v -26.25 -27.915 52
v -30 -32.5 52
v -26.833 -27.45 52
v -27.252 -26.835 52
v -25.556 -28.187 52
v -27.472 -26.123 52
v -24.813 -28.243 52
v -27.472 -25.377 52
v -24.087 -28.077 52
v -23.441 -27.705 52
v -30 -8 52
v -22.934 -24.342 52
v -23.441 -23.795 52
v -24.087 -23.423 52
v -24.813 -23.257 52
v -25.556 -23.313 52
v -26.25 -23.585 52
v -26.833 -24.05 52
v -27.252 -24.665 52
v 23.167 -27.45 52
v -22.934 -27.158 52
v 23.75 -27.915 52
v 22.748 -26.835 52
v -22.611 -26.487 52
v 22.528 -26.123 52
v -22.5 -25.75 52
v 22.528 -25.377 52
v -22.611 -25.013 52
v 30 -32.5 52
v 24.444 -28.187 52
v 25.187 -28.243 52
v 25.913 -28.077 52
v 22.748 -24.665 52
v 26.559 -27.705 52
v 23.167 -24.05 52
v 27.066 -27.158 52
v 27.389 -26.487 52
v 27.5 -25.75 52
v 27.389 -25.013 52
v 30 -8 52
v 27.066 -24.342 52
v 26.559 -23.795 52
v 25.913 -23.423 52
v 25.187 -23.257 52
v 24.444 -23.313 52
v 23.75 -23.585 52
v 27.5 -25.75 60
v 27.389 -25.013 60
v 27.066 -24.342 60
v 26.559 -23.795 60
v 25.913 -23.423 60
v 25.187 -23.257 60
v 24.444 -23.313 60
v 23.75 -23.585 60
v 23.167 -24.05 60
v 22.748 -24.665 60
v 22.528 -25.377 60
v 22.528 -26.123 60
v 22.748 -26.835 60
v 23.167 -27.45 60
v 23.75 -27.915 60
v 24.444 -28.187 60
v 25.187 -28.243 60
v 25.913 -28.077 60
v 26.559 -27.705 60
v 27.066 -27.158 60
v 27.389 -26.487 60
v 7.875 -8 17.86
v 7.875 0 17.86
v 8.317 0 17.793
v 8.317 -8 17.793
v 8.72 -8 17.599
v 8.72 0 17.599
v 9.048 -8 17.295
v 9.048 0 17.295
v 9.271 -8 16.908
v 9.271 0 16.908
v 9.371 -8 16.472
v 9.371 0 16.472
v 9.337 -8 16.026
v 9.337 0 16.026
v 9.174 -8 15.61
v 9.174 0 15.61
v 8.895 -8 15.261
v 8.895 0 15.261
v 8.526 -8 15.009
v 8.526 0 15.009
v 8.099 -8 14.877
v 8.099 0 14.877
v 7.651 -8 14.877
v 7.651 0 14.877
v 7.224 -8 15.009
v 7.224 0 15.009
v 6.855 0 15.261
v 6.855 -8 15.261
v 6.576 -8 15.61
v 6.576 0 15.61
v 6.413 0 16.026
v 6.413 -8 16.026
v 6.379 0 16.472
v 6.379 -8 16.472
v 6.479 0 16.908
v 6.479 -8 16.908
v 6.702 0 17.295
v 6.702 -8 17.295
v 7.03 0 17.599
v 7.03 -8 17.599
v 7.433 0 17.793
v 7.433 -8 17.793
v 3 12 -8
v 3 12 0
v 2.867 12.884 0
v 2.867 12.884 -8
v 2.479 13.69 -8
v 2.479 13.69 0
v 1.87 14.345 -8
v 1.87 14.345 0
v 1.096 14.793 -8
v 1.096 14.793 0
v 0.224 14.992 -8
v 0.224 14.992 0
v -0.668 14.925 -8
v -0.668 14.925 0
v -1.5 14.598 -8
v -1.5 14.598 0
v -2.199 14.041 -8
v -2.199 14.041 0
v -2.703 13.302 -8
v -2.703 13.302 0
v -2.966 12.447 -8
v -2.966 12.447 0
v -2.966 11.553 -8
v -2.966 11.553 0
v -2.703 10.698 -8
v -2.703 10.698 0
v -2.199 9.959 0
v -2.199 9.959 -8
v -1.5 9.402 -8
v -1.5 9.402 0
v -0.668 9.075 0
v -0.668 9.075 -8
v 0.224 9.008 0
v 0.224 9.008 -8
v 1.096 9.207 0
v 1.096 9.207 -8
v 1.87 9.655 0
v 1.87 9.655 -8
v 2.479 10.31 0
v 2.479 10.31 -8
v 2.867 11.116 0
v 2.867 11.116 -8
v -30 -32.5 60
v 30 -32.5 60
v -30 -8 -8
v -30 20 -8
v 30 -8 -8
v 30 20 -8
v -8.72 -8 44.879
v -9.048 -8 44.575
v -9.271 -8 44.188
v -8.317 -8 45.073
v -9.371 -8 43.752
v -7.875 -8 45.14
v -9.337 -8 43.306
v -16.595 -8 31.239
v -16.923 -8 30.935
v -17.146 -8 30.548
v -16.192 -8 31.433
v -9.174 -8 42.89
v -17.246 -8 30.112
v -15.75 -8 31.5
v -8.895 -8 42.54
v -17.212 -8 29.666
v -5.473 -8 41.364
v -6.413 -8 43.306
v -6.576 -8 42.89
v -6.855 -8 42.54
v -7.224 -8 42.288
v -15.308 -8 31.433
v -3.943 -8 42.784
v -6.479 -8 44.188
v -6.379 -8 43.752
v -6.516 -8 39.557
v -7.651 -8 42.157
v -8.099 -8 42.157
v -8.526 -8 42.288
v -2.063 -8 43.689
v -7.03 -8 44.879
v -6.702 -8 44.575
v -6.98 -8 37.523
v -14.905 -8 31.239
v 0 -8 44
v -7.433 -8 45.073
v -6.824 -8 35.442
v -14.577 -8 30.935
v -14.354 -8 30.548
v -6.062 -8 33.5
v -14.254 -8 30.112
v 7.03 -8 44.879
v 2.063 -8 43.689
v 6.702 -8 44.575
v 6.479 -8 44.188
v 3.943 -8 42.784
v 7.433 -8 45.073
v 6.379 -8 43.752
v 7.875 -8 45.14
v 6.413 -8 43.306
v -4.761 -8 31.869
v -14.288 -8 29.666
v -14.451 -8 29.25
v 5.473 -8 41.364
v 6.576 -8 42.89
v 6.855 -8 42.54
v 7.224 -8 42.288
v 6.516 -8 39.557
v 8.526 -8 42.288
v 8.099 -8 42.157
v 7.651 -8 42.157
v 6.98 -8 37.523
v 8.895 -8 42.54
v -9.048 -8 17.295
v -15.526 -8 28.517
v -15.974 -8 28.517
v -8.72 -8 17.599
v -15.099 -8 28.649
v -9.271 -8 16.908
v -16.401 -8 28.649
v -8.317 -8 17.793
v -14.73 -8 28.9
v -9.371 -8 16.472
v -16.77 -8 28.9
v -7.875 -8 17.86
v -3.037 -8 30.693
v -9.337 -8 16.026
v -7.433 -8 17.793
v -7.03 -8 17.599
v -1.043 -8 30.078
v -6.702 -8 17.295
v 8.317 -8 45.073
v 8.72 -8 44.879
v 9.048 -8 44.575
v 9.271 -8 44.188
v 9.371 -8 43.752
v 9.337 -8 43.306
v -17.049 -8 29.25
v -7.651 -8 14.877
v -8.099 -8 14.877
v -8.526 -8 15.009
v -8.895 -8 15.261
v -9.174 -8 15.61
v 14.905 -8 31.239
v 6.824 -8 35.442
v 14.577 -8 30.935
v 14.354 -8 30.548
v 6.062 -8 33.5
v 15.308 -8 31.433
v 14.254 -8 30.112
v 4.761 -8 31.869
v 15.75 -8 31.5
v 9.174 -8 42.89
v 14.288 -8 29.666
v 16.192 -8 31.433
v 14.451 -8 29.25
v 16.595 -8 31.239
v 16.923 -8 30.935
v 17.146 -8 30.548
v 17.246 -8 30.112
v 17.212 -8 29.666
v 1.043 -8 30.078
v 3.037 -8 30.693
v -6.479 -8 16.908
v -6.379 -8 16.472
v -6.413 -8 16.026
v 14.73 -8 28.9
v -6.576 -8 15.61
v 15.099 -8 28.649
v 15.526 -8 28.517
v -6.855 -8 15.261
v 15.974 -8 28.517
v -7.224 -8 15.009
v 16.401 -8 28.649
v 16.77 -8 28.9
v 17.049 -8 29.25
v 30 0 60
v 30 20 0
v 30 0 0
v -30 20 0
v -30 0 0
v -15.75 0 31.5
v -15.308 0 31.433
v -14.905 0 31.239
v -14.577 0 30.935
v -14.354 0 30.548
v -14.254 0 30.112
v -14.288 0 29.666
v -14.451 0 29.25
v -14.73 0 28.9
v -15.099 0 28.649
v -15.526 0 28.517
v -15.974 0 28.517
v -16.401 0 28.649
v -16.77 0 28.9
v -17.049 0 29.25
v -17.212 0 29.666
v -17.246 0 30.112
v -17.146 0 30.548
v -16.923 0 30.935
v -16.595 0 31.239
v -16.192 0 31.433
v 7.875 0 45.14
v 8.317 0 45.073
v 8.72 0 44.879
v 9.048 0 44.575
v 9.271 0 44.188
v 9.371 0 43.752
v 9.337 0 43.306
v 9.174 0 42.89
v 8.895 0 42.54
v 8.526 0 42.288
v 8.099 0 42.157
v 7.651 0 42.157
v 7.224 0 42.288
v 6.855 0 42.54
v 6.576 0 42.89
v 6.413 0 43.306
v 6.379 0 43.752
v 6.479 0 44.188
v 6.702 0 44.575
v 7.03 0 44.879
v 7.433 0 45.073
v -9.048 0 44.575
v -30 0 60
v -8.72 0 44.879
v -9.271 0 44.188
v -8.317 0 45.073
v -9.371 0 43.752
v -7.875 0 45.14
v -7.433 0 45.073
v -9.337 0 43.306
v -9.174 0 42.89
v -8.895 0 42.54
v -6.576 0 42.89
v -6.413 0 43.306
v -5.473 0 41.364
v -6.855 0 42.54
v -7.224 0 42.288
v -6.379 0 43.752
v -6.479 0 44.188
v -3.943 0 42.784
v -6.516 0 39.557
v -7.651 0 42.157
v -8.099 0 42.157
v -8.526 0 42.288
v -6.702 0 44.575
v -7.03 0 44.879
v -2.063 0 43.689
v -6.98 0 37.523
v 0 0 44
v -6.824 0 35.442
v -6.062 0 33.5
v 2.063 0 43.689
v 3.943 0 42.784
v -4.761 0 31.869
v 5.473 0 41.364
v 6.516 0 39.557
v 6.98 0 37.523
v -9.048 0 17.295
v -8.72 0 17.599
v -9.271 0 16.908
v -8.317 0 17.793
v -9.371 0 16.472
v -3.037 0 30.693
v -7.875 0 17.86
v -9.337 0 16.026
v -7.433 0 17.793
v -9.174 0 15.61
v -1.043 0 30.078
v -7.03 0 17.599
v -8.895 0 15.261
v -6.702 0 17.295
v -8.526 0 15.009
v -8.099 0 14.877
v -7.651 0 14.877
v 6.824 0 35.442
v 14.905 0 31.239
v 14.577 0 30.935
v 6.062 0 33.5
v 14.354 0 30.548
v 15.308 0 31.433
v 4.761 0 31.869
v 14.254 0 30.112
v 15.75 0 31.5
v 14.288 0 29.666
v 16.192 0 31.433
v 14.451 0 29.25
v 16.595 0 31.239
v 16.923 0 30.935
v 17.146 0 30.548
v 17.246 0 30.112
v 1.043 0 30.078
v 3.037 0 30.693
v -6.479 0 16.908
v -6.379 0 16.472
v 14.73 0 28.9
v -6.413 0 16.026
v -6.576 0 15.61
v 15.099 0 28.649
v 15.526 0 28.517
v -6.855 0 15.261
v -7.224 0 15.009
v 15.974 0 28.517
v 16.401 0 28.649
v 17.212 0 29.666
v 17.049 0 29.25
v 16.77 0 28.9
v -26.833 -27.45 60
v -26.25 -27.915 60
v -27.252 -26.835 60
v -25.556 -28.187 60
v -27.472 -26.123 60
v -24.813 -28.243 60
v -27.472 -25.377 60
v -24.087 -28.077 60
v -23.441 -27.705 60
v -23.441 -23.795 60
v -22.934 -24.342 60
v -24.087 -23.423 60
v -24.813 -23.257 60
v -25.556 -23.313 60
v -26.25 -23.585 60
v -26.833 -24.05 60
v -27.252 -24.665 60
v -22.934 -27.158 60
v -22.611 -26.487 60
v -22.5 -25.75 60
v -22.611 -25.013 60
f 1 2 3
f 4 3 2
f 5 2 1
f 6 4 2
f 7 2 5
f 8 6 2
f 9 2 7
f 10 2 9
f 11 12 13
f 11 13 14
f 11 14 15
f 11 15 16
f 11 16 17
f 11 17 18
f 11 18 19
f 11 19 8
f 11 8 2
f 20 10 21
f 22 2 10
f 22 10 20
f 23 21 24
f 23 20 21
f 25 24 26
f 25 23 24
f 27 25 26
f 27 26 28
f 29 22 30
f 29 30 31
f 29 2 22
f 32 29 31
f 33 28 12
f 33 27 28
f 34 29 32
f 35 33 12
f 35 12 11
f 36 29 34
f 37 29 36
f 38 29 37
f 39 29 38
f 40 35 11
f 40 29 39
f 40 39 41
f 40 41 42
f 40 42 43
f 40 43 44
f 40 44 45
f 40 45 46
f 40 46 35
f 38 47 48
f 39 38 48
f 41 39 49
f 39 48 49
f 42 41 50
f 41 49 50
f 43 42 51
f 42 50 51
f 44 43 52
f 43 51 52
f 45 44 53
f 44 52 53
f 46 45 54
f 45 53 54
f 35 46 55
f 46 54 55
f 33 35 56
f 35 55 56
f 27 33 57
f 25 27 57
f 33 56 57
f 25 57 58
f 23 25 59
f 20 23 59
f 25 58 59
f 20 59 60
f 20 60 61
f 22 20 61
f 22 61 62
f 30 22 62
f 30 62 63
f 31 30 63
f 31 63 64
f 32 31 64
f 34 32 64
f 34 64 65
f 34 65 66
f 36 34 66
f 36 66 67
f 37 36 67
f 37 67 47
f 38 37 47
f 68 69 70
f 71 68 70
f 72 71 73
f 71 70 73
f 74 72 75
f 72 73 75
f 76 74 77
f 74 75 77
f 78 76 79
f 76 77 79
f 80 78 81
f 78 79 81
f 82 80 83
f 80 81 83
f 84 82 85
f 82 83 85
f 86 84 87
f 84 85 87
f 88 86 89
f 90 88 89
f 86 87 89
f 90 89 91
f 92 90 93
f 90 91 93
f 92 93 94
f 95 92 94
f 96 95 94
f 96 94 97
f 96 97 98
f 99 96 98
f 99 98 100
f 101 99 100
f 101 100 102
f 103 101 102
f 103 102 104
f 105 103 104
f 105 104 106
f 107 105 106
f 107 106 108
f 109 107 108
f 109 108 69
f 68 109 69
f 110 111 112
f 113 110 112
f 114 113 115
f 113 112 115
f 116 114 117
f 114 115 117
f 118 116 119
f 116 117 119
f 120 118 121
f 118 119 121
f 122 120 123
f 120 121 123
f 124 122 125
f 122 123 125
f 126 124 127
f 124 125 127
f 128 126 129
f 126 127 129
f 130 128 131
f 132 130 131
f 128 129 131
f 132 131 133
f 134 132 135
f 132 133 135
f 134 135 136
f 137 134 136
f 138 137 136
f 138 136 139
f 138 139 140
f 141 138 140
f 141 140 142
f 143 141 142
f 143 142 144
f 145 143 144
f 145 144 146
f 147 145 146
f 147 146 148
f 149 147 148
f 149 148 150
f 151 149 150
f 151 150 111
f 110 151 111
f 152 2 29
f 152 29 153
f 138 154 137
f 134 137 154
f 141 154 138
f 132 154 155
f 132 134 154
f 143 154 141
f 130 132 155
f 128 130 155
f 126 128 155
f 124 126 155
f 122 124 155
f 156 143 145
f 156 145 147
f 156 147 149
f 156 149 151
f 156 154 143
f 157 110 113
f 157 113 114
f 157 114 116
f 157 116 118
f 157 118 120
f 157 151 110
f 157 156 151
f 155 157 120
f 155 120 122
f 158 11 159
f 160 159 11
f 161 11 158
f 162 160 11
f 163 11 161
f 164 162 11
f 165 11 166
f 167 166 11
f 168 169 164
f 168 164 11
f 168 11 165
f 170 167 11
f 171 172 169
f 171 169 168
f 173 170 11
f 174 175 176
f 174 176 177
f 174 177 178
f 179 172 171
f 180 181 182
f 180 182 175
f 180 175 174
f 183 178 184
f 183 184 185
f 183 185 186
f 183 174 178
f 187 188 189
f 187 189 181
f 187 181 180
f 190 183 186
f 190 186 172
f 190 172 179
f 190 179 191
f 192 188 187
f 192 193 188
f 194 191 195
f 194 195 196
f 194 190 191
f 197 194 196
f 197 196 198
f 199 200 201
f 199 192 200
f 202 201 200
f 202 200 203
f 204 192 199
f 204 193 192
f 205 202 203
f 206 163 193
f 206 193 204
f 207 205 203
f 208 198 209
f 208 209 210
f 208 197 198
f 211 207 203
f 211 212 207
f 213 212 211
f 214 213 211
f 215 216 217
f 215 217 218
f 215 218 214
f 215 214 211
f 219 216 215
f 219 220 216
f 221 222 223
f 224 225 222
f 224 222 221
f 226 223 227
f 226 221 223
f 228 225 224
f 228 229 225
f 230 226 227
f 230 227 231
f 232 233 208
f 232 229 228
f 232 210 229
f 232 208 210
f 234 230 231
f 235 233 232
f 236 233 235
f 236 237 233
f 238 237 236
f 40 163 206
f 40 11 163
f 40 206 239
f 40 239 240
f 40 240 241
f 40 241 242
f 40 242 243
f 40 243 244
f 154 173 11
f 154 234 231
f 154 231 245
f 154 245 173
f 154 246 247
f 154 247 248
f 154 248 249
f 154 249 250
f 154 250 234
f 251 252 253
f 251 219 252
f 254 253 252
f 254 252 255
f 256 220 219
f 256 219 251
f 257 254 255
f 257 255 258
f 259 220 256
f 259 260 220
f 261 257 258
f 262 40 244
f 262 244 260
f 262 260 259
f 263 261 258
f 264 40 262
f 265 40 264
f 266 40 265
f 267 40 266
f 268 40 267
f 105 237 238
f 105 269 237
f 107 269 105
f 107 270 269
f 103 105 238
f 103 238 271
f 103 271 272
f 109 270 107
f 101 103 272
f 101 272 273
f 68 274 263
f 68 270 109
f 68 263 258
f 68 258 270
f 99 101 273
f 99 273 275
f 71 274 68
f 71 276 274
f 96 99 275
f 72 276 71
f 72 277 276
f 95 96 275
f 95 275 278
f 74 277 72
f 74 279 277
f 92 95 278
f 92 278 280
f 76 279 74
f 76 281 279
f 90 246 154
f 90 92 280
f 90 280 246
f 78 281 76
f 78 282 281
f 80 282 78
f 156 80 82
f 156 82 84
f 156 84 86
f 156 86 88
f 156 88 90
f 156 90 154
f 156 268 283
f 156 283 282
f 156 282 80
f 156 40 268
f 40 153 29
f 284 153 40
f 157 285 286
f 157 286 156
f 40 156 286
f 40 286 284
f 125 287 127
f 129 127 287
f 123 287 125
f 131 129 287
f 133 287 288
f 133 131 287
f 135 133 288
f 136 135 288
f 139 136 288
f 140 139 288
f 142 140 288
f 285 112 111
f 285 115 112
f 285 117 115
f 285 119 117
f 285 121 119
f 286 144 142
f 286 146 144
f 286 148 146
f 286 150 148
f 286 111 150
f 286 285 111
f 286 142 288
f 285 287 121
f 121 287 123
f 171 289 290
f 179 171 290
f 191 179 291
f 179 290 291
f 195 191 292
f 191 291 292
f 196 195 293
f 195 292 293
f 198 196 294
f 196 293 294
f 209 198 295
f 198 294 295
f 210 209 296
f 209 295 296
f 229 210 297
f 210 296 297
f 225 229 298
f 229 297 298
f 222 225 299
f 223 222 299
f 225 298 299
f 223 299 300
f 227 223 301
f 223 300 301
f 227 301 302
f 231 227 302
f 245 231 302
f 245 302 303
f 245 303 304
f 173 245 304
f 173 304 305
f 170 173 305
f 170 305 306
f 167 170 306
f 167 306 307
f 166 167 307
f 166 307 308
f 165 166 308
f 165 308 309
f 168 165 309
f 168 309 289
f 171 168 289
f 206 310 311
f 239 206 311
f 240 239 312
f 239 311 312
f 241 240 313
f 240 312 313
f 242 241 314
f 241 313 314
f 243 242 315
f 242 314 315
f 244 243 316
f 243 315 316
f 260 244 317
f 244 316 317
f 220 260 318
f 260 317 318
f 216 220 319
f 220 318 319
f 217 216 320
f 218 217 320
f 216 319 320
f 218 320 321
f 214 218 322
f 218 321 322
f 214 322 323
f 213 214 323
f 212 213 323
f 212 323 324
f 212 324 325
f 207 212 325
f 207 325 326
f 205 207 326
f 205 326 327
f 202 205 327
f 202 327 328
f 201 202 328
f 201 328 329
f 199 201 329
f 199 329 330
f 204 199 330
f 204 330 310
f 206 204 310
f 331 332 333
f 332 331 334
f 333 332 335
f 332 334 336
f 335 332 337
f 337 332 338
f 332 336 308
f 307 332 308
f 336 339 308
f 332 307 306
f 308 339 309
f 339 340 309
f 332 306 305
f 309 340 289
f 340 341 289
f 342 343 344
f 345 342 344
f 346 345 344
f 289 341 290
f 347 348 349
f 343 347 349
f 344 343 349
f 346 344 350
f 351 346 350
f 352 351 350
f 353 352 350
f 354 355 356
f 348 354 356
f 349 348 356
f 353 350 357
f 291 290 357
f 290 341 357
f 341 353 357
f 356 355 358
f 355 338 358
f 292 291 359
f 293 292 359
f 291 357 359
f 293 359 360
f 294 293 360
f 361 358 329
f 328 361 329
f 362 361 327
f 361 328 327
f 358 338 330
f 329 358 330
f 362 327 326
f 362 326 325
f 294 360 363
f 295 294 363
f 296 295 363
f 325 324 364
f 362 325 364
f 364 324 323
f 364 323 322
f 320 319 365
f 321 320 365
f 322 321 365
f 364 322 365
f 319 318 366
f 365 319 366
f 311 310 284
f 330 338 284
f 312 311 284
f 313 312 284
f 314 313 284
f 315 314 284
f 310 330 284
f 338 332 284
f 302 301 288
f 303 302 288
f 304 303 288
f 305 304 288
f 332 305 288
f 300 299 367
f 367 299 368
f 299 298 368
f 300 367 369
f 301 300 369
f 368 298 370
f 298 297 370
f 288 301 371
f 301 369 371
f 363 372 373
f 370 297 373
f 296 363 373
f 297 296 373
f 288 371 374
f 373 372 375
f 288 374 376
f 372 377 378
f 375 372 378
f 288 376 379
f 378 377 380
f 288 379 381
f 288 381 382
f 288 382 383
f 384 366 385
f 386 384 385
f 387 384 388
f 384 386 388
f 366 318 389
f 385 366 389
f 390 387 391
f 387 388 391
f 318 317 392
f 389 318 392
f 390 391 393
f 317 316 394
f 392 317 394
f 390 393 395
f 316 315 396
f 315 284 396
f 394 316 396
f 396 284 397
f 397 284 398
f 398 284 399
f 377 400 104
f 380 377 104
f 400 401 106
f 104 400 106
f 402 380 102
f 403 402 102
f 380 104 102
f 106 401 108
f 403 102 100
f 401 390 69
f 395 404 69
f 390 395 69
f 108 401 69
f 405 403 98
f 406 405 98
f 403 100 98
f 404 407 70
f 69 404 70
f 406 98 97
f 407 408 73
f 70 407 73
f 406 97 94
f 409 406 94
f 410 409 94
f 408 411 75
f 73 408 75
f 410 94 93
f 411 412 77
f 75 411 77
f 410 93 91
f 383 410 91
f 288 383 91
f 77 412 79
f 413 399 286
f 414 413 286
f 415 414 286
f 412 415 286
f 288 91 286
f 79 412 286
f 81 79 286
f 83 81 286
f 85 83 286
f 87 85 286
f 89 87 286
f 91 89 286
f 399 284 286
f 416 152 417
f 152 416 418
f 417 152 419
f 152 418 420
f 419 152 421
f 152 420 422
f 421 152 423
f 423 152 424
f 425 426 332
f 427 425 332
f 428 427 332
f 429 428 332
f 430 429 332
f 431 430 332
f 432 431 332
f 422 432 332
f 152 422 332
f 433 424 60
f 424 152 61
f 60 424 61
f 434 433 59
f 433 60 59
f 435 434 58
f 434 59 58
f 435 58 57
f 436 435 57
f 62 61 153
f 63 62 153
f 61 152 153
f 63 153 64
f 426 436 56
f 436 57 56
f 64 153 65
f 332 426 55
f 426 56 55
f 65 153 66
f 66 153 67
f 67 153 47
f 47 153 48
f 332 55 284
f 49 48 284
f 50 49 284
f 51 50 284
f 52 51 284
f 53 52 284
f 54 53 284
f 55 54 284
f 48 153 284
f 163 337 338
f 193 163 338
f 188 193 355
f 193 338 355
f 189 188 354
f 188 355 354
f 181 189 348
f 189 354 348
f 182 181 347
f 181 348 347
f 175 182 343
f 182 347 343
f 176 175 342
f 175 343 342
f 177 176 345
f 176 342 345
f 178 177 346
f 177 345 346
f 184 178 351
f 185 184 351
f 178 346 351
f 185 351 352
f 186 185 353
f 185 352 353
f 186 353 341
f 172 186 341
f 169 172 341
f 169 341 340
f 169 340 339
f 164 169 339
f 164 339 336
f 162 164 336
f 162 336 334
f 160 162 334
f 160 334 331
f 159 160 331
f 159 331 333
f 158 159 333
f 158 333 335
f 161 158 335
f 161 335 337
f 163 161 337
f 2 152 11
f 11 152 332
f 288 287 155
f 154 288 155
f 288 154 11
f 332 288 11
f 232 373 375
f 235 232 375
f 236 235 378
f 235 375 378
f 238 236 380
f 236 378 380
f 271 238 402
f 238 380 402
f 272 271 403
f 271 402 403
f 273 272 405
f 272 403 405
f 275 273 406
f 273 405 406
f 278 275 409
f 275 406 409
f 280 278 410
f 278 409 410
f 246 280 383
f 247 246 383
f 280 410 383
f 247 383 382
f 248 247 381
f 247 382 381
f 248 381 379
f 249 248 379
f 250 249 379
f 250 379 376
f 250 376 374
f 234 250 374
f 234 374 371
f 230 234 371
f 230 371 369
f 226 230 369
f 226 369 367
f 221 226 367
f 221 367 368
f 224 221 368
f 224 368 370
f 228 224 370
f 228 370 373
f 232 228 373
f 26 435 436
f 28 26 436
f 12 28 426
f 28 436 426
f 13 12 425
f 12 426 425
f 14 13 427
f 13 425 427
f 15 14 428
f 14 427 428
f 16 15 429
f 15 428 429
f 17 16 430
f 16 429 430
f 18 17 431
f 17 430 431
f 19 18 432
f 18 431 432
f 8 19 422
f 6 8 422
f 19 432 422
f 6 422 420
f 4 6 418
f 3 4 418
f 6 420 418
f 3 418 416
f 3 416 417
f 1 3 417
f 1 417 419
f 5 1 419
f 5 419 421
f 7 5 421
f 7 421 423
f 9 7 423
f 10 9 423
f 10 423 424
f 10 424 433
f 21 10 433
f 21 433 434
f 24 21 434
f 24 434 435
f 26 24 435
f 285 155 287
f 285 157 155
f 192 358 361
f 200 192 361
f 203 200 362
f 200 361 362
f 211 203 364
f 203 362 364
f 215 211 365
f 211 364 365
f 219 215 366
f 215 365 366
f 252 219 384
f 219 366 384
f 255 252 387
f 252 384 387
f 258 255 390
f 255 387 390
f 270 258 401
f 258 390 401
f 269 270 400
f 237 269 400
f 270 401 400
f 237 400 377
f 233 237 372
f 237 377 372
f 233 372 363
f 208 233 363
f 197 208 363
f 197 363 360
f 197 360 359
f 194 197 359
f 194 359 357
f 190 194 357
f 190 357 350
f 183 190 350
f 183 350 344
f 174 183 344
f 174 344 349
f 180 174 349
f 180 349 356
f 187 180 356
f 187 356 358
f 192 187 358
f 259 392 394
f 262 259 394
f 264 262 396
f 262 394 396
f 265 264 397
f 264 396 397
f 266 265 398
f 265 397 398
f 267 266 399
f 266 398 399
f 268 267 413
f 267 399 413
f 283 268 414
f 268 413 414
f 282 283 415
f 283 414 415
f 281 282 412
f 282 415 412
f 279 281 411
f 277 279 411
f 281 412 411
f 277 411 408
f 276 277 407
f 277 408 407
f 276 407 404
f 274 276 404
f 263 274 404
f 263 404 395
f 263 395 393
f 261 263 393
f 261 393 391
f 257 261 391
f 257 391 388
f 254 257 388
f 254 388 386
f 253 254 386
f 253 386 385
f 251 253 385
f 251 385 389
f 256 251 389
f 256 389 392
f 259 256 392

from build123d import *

# Parameters (mm, degrees)
BOSS_EXTRUDE1_DEPTH = 30
SKETCH2_R           = 7
SKETCH2_R_2         = 1.5
CUT_EXTRUDE1_DEPTH  = 55
SKETCH3_R           = 3
CUT_EXTRUDE2_DEPTH  = 55
SKETCH4_W           = 8
SKETCH4_H           = 40
BOSS_EXTRUDE2_DEPTH = 60
SKETCH5_R           = 2.5
CUT_EXTRUDE3_DEPTH  = 10
SKETCH6_W           = 8
SKETCH6_H           = 7.5
CUT_EXTRUDE4_DEPTH  = 94.808315196


with BuildPart() as part:
    # Sketch1 → Boss-Extrude1 (new, symmetric)
    with BuildSketch(Plane(origin=(0, 0, 0), x_dir=(0, 0, -1), z_dir=(1, 0, 0))):
        Polygon((0, 20), (0, 0), (-52, 0), (-52, -8), (8, -8), (8, 20), align=None)
    extrude(amount=BOSS_EXTRUDE1_DEPTH, both=True)

    # Sketch2 → Cut-Extrude1 (cut)
    with BuildSketch(Plane(origin=(0, 0, 0), x_dir=(1, 0, 0), z_dir=(0, 1, 0))):
        with Locations(Location((0, -37, 0), (0, 0, 270))):
            Circle(SKETCH2_R)
        with Locations(Location((15.75, -30, 0), (0, 0, 270))):
            Circle(SKETCH2_R_2)
        with Locations(Location((7.875, -43.63990011, 0), (0, 0, 270))):
            Circle(SKETCH2_R_2)
        with Locations(Location((-7.875, -43.63990011, 0), (0, 0, 270))):
            Circle(SKETCH2_R_2)
        with Locations(Location((-15.75, -30, 0), (0, 0, 270))):
            Circle(SKETCH2_R_2)
        with Locations(Location((-7.875, -16.36009989, 0), (0, 0, 270))):
            Circle(SKETCH2_R_2)
        with Locations(Location((7.875, -16.36009989, 0), (0, 0, 270))):
            Circle(SKETCH2_R_2)
    extrude(amount=-CUT_EXTRUDE1_DEPTH, mode=Mode.SUBTRACT)

    # Sketch3 → Cut-Extrude2 (cut)
    with BuildSketch(Plane.XY):
        with Locations((0, 12)):
            Circle(SKETCH3_R)
    extrude(amount=-CUT_EXTRUDE2_DEPTH, mode=Mode.SUBTRACT)

    # Sketch4 → Boss-Extrude2 (add)
    with BuildSketch(Plane(origin=(30, 0, 0), x_dir=(0, 0, -1), z_dir=(1, 0, 0))):
        with Locations((-56, -20)):
            Rectangle(SKETCH4_W, SKETCH4_H)
    extrude(amount=-BOSS_EXTRUDE2_DEPTH)

    # Sketch5 → Cut-Extrude3 (cut)
    with BuildSketch(Plane.XY.offset(60)):
        with Locations((25, -25.75)):
            Circle(SKETCH5_R)
        with Locations((-25, -25.75)):
            Circle(SKETCH5_R)
    extrude(amount=-CUT_EXTRUDE3_DEPTH, mode=Mode.SUBTRACT)

    # Sketch6 → Cut-Extrude4 (cut, through all)
    with BuildSketch(Plane.ZY.offset(30)):
        with Locations((56, -36.25)):
            Rectangle(SKETCH6_W, SKETCH6_H)
    extrude(amount=-CUT_EXTRUDE4_DEPTH, mode=Mode.SUBTRACT)


solid = part.part
